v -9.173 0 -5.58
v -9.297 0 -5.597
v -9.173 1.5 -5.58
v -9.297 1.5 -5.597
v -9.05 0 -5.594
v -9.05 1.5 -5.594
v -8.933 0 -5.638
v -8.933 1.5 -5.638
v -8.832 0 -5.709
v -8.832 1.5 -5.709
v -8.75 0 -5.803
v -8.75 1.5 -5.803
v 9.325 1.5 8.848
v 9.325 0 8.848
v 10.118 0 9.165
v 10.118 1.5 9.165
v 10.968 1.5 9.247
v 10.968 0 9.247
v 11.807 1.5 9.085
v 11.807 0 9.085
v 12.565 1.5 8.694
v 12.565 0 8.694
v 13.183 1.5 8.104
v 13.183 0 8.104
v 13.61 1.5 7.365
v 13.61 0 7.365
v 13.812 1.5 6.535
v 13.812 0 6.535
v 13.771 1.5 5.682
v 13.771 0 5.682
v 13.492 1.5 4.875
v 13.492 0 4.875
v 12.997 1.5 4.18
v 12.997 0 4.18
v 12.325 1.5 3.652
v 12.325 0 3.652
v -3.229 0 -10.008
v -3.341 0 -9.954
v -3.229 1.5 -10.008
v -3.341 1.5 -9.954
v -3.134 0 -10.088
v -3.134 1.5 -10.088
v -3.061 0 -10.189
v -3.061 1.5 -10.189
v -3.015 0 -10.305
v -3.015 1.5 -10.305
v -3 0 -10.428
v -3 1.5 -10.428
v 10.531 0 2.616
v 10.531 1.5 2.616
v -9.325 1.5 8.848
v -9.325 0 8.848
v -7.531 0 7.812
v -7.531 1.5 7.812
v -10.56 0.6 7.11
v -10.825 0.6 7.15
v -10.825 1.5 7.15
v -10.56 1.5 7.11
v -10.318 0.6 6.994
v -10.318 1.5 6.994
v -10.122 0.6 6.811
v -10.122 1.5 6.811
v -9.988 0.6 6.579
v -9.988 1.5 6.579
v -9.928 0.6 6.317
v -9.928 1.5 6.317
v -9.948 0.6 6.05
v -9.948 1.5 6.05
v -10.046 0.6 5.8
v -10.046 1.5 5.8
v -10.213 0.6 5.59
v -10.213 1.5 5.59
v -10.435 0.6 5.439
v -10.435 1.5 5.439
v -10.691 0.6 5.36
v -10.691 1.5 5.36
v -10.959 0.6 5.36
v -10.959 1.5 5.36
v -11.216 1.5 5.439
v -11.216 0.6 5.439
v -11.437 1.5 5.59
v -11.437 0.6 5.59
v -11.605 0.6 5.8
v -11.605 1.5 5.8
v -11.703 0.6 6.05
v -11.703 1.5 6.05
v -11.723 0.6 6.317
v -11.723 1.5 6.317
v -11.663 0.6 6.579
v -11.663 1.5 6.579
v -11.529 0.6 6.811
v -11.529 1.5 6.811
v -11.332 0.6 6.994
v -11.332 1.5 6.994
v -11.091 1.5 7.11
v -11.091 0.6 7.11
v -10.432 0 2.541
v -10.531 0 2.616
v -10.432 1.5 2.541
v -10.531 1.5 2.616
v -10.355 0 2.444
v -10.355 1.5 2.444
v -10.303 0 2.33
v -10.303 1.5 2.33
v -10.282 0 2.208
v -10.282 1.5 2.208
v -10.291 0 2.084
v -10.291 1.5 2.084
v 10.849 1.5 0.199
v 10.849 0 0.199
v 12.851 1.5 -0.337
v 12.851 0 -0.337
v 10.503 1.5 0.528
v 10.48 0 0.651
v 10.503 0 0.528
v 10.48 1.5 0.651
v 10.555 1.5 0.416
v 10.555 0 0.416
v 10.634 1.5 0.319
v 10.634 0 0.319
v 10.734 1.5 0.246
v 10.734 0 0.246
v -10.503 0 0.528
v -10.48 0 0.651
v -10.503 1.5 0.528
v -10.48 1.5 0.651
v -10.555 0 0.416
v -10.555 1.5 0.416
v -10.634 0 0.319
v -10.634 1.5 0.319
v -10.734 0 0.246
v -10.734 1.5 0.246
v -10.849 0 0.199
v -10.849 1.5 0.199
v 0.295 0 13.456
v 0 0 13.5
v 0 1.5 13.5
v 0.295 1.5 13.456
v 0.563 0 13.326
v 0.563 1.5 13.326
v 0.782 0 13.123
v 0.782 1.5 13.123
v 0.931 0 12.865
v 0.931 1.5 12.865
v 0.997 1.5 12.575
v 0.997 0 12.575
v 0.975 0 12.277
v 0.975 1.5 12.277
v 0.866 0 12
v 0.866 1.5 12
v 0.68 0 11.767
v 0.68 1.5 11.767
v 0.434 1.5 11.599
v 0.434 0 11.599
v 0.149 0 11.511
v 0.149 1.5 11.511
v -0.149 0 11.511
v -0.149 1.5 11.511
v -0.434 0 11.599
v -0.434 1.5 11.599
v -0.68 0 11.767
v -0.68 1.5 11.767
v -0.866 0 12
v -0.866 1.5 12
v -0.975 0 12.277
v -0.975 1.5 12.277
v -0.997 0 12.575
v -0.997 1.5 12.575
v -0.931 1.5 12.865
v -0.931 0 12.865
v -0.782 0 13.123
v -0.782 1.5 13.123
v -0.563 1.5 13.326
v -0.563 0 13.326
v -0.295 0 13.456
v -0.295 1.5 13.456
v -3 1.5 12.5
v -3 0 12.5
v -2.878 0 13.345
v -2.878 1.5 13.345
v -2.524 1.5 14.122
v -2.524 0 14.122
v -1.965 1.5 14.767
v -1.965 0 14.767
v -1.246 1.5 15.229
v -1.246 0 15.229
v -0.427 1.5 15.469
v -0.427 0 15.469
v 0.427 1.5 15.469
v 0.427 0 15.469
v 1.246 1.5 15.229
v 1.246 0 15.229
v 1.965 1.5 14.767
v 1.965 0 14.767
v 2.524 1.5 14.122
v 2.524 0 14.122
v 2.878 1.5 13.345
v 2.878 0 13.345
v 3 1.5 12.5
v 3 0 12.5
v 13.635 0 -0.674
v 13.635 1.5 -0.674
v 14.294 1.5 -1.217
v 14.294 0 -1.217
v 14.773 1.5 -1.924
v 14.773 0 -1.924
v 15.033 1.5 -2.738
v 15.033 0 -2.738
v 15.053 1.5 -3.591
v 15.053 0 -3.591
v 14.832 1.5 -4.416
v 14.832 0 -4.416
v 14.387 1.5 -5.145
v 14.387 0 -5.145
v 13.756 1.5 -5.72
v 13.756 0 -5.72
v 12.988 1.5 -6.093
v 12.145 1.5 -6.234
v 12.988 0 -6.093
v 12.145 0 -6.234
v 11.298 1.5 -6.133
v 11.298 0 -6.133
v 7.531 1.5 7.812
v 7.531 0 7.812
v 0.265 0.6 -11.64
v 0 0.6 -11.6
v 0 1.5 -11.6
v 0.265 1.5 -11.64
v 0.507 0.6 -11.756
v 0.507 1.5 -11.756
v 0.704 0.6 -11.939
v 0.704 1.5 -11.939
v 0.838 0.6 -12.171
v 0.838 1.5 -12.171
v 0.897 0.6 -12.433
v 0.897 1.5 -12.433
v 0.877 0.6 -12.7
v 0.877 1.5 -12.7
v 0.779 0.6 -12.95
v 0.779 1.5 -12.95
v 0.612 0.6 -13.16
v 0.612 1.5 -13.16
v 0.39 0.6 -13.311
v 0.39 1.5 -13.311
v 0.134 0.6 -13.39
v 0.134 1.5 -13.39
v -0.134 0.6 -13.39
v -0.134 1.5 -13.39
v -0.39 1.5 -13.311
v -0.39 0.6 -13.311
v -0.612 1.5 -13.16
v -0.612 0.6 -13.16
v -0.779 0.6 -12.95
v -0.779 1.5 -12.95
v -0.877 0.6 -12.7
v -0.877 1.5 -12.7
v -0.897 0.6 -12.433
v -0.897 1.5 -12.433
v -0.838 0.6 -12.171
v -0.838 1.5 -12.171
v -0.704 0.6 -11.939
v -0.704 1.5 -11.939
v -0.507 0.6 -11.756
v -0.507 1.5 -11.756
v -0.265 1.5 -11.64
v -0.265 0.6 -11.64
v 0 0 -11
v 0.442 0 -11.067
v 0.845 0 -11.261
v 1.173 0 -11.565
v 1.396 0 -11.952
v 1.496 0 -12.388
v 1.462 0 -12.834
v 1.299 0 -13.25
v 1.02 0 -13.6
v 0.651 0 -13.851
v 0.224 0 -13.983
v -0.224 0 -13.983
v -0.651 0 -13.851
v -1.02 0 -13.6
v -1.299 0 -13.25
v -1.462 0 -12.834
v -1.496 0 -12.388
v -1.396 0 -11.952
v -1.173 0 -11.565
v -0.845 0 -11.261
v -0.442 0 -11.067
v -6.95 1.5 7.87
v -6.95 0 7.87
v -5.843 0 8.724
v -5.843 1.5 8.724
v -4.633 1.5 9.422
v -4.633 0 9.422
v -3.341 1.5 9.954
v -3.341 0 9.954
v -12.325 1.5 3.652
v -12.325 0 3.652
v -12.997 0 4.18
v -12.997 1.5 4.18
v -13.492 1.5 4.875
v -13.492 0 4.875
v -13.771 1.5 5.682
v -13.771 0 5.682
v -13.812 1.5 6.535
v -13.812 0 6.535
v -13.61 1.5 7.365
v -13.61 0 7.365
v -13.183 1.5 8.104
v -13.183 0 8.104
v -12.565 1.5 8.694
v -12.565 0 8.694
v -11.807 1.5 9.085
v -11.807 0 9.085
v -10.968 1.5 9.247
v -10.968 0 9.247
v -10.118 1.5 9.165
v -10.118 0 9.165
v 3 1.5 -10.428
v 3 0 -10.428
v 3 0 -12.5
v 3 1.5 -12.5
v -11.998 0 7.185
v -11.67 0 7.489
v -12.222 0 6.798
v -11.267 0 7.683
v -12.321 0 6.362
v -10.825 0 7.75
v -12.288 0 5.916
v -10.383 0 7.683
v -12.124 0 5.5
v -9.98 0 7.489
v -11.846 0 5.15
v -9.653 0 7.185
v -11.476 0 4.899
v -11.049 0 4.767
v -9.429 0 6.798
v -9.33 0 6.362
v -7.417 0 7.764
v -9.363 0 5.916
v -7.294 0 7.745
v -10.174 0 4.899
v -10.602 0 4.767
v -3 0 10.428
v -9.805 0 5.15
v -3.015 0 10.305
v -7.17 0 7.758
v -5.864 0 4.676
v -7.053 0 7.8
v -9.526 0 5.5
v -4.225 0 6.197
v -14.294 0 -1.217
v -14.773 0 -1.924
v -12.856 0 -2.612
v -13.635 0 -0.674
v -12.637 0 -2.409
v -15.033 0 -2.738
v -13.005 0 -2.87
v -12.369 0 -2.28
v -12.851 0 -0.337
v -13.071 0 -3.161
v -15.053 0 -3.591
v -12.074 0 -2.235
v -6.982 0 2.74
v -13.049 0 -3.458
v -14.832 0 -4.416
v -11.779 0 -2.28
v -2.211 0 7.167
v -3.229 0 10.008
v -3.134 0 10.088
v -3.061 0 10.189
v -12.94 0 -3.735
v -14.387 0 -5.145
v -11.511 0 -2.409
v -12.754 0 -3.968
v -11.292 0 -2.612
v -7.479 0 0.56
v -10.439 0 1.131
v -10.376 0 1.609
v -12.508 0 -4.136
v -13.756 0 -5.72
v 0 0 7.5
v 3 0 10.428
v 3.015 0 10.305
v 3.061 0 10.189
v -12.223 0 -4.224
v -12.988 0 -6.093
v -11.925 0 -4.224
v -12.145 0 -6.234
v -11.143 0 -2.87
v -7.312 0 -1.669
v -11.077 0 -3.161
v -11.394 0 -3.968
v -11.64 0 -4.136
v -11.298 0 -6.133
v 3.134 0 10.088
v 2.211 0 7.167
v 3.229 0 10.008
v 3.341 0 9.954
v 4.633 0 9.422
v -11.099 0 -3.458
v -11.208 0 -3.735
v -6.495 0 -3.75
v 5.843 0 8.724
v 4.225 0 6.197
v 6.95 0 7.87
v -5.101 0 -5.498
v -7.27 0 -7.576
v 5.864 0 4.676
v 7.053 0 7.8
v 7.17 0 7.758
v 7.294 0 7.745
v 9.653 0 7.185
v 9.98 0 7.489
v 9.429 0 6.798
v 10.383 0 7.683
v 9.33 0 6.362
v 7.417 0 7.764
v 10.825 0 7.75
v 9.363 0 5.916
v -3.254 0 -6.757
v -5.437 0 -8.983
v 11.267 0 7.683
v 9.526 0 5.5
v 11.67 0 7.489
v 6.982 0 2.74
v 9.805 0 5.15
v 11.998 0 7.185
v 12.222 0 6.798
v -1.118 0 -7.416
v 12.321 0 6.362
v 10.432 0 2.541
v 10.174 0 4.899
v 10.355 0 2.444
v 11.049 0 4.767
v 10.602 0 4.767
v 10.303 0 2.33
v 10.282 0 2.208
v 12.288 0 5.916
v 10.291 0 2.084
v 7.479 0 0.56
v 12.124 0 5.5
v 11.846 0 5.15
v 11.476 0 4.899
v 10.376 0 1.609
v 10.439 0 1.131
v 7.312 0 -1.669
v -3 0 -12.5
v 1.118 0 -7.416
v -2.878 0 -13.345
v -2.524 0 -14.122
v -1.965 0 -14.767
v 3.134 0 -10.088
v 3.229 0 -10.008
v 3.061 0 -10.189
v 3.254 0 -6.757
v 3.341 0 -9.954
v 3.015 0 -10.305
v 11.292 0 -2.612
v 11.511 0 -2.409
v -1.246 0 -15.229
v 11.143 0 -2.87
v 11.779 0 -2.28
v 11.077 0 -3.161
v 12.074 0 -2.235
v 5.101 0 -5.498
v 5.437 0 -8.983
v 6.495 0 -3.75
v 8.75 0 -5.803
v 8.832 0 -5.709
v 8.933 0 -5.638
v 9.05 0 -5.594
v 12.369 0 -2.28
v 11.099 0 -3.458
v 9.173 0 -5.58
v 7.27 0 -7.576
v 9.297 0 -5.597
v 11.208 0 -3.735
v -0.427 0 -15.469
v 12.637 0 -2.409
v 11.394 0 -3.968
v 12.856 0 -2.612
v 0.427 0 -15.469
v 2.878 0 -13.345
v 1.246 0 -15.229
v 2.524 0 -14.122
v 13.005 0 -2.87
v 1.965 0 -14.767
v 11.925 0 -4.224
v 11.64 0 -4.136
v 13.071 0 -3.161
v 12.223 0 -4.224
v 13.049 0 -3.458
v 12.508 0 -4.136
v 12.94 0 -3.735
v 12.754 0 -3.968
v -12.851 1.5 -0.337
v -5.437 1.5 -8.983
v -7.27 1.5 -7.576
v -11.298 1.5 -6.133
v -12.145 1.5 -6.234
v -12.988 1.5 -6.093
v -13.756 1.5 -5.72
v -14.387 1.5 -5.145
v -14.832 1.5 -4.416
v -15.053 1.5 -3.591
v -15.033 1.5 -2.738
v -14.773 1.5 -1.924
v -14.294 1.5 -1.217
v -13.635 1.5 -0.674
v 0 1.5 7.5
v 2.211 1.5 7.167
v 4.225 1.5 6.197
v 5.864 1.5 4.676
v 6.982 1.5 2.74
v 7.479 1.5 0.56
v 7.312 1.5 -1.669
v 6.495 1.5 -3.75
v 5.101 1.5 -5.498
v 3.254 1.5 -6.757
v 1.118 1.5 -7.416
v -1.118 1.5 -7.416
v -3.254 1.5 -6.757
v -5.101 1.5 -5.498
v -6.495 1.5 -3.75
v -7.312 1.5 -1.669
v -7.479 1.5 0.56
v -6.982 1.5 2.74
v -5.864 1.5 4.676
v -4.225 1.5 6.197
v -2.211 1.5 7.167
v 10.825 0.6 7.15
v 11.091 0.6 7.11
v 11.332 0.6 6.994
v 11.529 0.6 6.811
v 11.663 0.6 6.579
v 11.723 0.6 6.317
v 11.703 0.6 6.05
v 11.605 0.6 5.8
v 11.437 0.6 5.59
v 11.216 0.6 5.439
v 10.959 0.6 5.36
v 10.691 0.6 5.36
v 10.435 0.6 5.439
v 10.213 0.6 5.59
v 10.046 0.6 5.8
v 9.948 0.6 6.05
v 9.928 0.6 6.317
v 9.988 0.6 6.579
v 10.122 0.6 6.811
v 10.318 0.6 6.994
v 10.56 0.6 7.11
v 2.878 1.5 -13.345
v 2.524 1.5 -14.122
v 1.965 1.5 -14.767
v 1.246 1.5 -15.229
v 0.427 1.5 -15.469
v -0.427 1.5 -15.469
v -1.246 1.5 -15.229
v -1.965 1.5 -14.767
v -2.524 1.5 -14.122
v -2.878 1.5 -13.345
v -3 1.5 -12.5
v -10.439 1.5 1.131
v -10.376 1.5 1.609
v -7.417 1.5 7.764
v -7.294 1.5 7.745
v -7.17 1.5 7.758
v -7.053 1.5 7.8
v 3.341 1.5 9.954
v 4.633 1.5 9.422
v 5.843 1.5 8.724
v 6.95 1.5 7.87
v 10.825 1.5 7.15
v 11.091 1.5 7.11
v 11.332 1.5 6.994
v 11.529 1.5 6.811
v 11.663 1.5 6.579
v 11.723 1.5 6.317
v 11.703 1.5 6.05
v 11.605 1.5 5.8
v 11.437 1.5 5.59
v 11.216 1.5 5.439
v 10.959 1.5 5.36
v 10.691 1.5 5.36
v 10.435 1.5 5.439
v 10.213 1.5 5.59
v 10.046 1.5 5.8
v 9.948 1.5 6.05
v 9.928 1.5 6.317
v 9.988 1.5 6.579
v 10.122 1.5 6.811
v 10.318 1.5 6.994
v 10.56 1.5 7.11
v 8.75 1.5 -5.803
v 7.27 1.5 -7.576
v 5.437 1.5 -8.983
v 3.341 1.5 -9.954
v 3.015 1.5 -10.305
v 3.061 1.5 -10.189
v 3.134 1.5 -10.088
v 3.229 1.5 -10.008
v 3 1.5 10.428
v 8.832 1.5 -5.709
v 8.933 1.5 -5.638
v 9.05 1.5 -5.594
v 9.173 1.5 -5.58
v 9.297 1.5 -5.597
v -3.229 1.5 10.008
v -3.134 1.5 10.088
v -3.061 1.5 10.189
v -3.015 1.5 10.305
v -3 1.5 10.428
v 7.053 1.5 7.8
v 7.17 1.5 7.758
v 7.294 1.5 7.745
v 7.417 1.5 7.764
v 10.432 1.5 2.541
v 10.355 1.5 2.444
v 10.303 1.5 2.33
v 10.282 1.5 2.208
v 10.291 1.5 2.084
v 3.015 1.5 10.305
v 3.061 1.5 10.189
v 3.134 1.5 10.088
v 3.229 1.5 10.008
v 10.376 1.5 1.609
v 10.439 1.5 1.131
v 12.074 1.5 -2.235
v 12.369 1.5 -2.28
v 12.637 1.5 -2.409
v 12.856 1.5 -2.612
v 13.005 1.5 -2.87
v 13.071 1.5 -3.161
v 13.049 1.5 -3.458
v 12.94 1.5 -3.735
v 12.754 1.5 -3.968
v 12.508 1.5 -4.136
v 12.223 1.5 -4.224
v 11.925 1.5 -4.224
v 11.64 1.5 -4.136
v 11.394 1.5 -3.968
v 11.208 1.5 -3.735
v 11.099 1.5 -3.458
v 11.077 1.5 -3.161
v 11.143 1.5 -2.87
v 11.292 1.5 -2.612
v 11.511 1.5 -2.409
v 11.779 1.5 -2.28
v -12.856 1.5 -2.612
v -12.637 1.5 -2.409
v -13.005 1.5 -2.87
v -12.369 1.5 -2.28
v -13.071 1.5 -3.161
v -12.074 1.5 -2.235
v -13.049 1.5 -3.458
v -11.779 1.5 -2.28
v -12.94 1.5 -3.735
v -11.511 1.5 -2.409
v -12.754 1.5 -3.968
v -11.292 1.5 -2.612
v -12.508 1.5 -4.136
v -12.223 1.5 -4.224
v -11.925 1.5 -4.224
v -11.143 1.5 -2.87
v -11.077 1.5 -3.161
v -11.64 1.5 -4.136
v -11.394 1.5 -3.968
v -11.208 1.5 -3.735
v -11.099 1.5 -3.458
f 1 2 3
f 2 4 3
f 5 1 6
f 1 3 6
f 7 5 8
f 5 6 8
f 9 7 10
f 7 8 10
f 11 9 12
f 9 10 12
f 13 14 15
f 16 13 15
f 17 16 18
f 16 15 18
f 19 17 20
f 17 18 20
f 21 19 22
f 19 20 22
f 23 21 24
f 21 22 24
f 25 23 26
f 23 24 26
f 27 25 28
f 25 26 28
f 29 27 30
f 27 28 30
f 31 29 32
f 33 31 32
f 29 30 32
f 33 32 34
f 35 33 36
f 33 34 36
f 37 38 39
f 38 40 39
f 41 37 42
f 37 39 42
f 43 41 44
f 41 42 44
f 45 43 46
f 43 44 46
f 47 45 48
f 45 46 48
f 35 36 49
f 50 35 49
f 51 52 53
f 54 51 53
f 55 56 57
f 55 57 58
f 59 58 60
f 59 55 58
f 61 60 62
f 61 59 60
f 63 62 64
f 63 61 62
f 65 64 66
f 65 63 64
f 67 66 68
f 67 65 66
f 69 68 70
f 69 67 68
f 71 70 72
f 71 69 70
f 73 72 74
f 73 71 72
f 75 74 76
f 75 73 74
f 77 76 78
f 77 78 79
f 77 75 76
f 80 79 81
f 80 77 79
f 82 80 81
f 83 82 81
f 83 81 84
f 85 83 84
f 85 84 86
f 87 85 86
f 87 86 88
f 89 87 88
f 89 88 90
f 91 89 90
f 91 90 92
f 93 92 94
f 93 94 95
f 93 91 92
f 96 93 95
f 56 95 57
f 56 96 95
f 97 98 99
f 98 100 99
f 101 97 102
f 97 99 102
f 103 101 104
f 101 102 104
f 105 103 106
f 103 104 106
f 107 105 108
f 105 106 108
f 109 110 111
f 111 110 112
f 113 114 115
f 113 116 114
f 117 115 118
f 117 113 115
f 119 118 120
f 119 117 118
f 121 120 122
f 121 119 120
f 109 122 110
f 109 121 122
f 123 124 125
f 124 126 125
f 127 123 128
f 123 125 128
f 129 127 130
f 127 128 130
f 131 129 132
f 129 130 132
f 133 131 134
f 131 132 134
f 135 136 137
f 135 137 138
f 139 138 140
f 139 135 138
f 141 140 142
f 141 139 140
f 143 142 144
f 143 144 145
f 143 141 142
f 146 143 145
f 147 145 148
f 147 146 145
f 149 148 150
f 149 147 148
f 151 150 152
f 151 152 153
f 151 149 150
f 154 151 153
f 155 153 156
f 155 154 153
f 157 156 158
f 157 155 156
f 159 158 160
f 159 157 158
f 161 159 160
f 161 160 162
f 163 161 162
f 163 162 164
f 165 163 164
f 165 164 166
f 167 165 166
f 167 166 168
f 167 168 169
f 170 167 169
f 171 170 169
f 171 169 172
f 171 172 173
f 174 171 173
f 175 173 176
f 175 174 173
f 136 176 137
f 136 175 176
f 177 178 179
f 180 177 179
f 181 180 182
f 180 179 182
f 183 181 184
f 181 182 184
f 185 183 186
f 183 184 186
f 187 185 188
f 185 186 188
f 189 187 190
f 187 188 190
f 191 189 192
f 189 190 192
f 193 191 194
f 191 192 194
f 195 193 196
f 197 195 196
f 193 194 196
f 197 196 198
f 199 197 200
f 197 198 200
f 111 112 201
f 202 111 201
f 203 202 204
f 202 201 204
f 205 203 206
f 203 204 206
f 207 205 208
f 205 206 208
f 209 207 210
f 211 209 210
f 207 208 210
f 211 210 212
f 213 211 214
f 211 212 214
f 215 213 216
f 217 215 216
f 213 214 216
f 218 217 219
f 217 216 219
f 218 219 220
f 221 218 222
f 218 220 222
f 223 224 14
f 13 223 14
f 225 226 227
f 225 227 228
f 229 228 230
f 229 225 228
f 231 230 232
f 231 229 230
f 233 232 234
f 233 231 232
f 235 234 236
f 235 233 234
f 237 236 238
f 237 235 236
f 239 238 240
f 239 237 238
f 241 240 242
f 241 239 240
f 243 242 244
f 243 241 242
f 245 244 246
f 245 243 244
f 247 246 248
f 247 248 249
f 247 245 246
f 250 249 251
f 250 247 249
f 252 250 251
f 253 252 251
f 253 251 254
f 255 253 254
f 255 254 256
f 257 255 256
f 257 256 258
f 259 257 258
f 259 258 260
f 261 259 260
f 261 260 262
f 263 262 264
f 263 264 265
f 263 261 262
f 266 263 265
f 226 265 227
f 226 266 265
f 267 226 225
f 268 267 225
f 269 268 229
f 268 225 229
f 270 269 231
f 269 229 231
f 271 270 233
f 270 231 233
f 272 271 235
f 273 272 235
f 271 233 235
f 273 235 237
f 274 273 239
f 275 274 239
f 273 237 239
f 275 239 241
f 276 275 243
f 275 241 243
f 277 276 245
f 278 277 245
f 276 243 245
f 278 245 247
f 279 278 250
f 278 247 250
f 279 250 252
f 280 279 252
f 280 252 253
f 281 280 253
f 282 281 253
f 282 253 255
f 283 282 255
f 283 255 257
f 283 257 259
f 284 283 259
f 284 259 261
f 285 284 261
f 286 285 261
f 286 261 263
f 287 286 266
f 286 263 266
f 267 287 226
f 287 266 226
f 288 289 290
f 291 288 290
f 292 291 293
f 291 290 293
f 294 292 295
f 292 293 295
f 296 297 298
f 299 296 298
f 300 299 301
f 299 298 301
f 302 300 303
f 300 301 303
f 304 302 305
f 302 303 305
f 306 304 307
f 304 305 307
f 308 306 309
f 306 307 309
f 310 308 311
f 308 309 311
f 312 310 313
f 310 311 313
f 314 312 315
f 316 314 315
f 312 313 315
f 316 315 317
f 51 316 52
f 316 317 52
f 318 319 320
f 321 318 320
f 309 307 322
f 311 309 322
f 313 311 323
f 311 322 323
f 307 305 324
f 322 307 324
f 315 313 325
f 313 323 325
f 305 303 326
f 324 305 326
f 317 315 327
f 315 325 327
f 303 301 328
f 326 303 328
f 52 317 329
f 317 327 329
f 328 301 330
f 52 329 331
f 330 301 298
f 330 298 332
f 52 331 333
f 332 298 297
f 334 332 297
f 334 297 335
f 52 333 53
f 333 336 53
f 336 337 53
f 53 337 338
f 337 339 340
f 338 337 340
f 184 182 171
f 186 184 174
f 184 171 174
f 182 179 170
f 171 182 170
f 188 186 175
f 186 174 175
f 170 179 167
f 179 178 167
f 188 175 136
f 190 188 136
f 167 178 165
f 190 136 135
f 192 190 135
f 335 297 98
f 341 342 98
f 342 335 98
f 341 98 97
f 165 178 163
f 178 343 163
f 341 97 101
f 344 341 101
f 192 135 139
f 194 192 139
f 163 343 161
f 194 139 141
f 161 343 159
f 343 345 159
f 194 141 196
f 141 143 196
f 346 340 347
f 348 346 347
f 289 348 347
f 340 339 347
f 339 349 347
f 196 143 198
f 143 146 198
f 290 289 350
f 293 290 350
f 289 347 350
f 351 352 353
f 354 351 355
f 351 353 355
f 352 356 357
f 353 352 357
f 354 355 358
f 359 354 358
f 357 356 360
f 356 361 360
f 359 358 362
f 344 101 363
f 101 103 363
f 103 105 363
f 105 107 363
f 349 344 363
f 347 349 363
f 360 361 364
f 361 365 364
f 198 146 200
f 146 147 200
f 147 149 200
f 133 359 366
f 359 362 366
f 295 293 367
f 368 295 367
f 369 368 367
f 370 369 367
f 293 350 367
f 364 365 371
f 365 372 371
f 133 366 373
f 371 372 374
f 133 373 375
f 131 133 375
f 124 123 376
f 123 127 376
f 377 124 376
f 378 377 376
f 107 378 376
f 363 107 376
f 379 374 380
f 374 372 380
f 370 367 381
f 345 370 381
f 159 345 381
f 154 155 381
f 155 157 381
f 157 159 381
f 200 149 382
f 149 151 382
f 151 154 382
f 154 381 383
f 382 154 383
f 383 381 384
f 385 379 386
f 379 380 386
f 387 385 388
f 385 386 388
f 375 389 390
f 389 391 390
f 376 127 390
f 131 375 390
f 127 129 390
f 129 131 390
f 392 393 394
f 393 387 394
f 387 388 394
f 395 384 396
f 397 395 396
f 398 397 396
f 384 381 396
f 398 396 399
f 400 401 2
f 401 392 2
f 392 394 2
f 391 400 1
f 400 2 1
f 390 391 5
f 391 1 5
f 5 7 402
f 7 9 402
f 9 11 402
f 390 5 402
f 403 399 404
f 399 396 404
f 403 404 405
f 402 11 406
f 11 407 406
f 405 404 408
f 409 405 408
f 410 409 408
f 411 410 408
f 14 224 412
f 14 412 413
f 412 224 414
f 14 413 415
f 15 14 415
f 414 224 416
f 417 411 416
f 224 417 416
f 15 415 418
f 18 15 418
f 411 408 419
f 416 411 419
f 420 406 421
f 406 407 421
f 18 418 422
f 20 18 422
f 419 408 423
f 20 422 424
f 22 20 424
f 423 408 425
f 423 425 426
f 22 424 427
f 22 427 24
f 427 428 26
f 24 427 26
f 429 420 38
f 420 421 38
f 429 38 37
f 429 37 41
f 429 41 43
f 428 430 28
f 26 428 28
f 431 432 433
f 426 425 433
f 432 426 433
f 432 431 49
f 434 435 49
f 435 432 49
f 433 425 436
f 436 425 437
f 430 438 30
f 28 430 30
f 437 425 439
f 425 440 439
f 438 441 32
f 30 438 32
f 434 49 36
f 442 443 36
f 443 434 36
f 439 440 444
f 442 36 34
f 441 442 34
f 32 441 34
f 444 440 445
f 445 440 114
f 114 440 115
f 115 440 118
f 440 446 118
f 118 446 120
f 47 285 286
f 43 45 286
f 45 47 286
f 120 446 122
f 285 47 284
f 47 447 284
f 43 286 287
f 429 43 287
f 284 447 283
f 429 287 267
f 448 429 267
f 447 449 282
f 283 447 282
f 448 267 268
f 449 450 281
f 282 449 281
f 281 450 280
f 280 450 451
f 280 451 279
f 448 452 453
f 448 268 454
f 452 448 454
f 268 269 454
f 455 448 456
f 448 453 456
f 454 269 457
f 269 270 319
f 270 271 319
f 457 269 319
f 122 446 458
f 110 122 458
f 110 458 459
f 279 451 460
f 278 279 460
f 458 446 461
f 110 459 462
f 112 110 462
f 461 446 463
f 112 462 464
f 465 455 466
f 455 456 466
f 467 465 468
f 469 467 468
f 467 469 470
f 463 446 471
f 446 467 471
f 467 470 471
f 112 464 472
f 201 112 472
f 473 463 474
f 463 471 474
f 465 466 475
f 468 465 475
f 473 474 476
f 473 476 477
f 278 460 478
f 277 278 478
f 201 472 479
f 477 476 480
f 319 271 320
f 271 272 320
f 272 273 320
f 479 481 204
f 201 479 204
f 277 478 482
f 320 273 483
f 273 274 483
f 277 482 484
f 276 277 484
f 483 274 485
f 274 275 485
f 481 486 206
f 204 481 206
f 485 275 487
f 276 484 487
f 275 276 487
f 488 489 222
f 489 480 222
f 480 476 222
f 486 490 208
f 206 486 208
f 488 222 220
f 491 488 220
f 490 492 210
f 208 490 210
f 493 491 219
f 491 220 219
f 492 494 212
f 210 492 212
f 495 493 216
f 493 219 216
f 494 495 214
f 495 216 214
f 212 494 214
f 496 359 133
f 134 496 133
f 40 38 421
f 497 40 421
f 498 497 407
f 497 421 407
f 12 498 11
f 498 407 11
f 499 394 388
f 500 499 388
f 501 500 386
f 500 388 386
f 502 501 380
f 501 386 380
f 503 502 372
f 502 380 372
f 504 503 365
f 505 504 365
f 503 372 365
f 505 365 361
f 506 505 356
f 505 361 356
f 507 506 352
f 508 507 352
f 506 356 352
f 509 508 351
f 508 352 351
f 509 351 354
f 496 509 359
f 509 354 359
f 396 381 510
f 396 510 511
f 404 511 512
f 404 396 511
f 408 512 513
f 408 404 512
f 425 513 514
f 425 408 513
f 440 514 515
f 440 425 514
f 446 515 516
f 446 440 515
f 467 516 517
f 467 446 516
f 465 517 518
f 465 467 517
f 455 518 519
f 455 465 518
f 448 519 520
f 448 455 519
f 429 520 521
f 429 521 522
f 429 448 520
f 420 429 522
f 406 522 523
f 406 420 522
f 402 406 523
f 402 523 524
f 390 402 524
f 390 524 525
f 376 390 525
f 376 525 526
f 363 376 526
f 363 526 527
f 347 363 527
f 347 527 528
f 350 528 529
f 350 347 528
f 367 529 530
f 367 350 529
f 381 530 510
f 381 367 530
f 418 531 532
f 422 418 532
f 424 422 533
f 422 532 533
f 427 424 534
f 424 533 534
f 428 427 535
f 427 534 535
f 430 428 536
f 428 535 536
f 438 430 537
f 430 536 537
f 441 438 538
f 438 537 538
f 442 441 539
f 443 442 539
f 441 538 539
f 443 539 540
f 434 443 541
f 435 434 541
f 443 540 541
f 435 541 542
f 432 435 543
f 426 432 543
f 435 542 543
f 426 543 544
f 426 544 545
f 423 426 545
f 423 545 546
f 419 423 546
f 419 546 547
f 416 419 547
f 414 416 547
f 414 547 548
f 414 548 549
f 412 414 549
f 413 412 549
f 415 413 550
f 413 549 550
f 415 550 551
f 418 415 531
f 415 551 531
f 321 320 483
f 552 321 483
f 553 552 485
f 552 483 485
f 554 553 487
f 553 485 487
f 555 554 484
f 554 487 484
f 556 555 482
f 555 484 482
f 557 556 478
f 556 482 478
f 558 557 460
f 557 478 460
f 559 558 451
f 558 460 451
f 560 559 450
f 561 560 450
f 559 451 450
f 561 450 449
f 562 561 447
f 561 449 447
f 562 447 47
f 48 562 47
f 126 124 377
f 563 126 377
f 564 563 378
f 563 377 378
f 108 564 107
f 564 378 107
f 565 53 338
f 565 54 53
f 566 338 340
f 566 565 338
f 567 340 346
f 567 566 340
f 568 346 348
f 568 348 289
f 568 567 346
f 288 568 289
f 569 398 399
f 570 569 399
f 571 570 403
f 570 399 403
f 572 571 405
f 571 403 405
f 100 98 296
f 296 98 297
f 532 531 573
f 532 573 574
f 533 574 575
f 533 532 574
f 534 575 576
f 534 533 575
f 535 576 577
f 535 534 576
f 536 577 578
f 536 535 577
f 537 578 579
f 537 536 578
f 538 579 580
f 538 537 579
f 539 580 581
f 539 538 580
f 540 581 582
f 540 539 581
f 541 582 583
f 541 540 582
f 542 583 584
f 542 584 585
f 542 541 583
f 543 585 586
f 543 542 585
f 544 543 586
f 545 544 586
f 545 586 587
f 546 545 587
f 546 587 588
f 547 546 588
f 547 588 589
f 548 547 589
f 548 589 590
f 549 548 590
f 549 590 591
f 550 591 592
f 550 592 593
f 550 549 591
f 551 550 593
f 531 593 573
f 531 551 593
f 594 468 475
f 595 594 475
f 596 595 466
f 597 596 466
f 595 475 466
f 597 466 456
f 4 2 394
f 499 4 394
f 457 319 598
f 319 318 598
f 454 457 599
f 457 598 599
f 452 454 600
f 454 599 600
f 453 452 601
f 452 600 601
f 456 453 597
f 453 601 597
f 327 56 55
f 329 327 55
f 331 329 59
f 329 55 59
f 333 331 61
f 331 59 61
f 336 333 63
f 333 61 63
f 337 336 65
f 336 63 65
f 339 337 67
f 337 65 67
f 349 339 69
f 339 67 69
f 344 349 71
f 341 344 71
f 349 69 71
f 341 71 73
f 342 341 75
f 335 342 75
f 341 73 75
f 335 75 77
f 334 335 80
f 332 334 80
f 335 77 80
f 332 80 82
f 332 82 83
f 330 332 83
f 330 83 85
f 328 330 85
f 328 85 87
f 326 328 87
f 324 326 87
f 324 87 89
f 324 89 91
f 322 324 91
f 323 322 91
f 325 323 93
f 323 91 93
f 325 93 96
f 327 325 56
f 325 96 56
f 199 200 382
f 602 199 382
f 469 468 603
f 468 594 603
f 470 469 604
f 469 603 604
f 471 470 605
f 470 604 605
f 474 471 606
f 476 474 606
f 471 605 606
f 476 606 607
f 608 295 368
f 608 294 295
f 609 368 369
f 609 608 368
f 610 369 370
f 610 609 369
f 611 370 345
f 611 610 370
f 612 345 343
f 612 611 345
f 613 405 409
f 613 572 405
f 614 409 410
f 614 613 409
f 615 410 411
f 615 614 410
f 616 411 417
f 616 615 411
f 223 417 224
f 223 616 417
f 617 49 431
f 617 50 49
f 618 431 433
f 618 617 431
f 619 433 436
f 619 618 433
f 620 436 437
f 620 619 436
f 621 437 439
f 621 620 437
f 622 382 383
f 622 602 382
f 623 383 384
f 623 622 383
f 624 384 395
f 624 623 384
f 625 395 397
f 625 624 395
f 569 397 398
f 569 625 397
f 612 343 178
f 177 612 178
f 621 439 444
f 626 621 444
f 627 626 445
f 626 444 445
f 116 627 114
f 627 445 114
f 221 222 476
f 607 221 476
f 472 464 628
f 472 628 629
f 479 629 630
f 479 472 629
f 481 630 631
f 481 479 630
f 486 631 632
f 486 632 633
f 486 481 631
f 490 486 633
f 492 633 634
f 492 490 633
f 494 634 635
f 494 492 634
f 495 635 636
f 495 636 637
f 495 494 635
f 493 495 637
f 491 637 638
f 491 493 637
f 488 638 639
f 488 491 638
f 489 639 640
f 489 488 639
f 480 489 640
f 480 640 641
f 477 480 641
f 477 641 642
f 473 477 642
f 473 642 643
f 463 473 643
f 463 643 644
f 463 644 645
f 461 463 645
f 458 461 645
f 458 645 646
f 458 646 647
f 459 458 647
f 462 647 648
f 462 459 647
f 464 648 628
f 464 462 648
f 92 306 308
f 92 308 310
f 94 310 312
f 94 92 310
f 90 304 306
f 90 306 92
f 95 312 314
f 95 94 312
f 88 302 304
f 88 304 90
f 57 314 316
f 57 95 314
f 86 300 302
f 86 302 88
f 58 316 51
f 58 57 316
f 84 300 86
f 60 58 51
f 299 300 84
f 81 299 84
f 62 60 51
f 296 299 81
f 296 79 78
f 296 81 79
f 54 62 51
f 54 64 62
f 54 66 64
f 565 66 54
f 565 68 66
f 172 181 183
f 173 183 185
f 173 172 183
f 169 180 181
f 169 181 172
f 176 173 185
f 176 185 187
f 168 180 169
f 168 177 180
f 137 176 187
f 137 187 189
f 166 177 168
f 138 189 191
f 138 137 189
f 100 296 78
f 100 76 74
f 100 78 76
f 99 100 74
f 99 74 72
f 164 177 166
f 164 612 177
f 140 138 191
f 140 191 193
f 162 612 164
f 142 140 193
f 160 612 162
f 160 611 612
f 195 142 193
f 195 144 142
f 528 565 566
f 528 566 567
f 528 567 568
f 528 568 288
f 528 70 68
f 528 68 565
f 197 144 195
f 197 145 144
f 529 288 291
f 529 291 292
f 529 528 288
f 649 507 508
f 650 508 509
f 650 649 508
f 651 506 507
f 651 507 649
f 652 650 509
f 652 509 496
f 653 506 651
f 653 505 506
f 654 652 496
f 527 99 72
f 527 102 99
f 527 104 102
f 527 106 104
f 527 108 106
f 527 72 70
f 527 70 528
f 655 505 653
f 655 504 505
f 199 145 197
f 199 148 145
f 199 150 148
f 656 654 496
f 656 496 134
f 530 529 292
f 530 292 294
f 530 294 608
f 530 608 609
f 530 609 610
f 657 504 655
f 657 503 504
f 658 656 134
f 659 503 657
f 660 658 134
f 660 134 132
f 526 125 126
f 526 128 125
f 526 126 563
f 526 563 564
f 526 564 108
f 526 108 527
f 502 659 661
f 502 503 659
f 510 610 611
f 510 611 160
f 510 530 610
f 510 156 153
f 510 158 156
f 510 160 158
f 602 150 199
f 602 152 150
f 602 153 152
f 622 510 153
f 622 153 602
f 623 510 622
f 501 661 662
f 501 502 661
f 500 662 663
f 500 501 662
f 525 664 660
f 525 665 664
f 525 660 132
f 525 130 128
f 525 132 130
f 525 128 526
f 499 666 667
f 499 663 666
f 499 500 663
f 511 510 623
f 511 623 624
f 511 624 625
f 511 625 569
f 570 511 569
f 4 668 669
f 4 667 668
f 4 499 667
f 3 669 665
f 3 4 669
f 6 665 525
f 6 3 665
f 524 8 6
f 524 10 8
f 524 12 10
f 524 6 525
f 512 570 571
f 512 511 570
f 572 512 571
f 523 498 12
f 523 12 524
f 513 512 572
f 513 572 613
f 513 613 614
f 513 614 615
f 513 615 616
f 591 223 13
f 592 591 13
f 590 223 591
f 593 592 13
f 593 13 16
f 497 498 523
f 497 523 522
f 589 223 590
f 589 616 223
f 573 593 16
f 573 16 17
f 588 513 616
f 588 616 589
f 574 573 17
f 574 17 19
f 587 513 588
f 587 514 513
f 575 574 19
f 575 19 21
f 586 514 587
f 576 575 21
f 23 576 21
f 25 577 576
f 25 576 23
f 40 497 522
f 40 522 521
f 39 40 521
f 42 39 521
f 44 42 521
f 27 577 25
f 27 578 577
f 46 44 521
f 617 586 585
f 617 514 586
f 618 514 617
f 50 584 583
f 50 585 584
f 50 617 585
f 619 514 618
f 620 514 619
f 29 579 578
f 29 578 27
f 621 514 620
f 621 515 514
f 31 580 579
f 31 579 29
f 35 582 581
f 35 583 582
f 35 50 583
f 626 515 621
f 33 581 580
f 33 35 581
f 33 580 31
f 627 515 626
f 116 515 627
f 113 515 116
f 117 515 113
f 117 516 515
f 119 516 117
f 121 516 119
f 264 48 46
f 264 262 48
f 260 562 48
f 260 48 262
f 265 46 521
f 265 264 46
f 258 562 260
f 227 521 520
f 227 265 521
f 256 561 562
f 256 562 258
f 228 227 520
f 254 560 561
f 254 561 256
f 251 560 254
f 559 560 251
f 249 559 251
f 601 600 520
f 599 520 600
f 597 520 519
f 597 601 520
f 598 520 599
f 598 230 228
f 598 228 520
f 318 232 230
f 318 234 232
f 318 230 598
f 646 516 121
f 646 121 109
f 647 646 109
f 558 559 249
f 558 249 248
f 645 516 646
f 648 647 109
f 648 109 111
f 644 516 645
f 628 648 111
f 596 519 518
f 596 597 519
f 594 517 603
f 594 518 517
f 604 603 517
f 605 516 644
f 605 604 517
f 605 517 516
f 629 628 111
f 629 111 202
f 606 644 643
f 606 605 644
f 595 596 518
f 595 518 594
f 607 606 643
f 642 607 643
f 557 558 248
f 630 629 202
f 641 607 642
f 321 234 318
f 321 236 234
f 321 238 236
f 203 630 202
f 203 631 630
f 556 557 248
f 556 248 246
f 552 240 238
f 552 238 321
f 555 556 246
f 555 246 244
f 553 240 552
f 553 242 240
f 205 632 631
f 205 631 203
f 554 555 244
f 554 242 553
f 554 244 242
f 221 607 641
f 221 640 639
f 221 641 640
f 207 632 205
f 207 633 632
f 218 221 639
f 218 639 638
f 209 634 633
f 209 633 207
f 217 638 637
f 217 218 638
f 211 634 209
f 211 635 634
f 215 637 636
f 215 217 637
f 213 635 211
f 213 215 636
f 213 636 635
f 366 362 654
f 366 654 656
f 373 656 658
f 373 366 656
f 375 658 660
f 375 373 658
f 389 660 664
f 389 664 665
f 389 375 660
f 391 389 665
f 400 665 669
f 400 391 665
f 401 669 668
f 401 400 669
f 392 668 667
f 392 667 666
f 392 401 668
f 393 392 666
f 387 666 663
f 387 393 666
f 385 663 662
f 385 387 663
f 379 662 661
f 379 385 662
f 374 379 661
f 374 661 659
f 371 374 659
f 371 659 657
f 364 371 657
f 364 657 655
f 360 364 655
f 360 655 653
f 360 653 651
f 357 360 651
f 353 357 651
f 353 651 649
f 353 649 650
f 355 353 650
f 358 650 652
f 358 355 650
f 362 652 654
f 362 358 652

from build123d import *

# Parameters (mm, degrees)
SKETCH1_R           = 1
SKETCH1_R_2         = 0.9
SKETCH1_R_3         = 7.5
BOSS_EXTRUDE1_DEPTH = 1.5
FILLET1_R           = 0.5
CHAMFER1_SIZE       = 0.6


with BuildPart() as part:
    # Sketch1 → Boss-Extrude1 (new body)
    with BuildSketch(Plane(origin=(0, 0, 0), x_dir=(1, 0, 0), z_dir=(0, 1, 0))):
        with BuildLine():
            Line((-10.214212529, -2.433076738), (-12.325317547, -3.651923789))
            ThreePointArc((-12.325317547, -3.651923789), (-13.423393759, -7.75), (-9.325317547, -8.848076211))
            Line((-9.325317547, -8.848076211), (-7.214212529, -7.629229161))
            ThreePointArc((-7.214212529, -7.629229161), (-5.25, -9.09326674), (-3, -10.062305899))
            Line((-3, -10.062305899), (-3, -12.5))
            ThreePointArc((-3, -12.5), (0, -15.5), (3, -12.5))
            Line((3, -12.5), (3, -10.062305899))
            ThreePointArc((3, -10.062305899), (5.25, -9.09326674), (7.214212529, -7.629229161))
            Line((7.214212529, -7.629229161), (9.325317547, -8.848076211))
            ThreePointArc((9.325317547, -8.848076211), (13.423393759, -7.75), (12.325317547, -3.651923789))
            Line((12.325317547, -3.651923789), (10.214212529, -2.433076738))
            ThreePointArc((10.214212529, -2.433076738), (10.410171044, -1.370525018), (10.495898275, -0.293461075))
            Line((10.495898275, -0.293461075), (12.850529964, 0.337460585))
            ThreePointArc((12.850529964, 0.337460585), (14.971850307, 4.011695199), (11.297615693, 6.133015543))
            Line((11.297615693, 6.133015543), (8.942984004, 5.502093883))
            ThreePointArc((8.942984004, 5.502093883), (6.391995005, 8.330210073), (3, 10.062305899))
            Line((3, 10.062305899), (3, 12.5))
            ThreePointArc((3, 12.5), (0, 15.5), (-3, 12.5))
            Line((-3, 12.5), (-3, 10.062305899))
            ThreePointArc((-3, 10.062305899), (-6.391995005, 8.330210073), (-8.942984004, 5.502093883))
            Line((-8.942984004, 5.502093883), (-11.297615693, 6.133015543))
            ThreePointArc((-11.297615693, 6.133015543), (-14.971850307, 4.011695199), (-12.850529964, 0.337460585))
            Line((-12.850529964, 0.337460585), (-10.495898275, -0.293461075))
            ThreePointArc((-10.495898275, -0.293461075), (-10.410171044, -1.370525018), (-10.214212529, -2.433076738))
        make_face()
        with Locations(Location((0, -12.5, 0), (0, 0, 270))):
            Circle(SKETCH1_R, mode=Mode.SUBTRACT)
        with Locations(Location((-10.825317547, -6.25, 0), (0, 0, 270))):
            Circle(SKETCH1_R_2, mode=Mode.SUBTRACT)
        with Locations(Location((10.825317547, -6.25, 0), (0, 0, 270))):
            Circle(SKETCH1_R_2, mode=Mode.SUBTRACT)
        with Locations(Location((0, 0, 0), (0, 0, 270))):
            Circle(SKETCH1_R_3, mode=Mode.SUBTRACT)
        with Locations(Location((0, 12.5, 0), (0, 0, 270))):
            Circle(SKETCH1_R_2, mode=Mode.SUBTRACT)
        with Locations(Location((12.074072829, 3.235238064, 0), (0, 0, 270))):
            Circle(SKETCH1_R, mode=Mode.SUBTRACT)
        with Locations(Location((-12.074072829, 3.235238064, 0), (0, 0, 270))):
            Circle(SKETCH1_R, mode=Mode.SUBTRACT)
    extrude(amount=BOSS_EXTRUDE1_DEPTH)

    # Fillet1
    fillet1_edges = [part.edges().sort_by_distance(p)[0] for p in [
        (-7.214212529, 0.75, 7.629229161),
        (-10.214212529, 0.75, 2.433076738),
        (-10.495898275, 0.75, 0.293461075),
        (-8.942984004, 0.75, -5.502093883),
        (-3, 0.75, -10.062305899),
        (3, 0.75, -10.062305899),
        (8.942984004, 0.75, -5.502093883),
        (10.495898275, 0.75, 0.293461075),
        (10.214212529, 0.75, 2.433076738),
        (7.214212529, 0.75, 7.629229161),
        (3, 0.75, 10.062305899),
        (-3, 0.75, 10.062305899),
    ]]
    fillet(fillet1_edges, radius=FILLET1_R)

    # Chamfer1
    chamfer1_edges = [part.edges().sort_by_distance(p)[0] for p in [
        (10.825317547, 0, 5.35),
        (-10.825317547, 0, 5.35),
        (0, 0, -13.4),
    ]]
    chamfer(chamfer1_edges, length=CHAMFER1_SIZE)


solid = part.part
